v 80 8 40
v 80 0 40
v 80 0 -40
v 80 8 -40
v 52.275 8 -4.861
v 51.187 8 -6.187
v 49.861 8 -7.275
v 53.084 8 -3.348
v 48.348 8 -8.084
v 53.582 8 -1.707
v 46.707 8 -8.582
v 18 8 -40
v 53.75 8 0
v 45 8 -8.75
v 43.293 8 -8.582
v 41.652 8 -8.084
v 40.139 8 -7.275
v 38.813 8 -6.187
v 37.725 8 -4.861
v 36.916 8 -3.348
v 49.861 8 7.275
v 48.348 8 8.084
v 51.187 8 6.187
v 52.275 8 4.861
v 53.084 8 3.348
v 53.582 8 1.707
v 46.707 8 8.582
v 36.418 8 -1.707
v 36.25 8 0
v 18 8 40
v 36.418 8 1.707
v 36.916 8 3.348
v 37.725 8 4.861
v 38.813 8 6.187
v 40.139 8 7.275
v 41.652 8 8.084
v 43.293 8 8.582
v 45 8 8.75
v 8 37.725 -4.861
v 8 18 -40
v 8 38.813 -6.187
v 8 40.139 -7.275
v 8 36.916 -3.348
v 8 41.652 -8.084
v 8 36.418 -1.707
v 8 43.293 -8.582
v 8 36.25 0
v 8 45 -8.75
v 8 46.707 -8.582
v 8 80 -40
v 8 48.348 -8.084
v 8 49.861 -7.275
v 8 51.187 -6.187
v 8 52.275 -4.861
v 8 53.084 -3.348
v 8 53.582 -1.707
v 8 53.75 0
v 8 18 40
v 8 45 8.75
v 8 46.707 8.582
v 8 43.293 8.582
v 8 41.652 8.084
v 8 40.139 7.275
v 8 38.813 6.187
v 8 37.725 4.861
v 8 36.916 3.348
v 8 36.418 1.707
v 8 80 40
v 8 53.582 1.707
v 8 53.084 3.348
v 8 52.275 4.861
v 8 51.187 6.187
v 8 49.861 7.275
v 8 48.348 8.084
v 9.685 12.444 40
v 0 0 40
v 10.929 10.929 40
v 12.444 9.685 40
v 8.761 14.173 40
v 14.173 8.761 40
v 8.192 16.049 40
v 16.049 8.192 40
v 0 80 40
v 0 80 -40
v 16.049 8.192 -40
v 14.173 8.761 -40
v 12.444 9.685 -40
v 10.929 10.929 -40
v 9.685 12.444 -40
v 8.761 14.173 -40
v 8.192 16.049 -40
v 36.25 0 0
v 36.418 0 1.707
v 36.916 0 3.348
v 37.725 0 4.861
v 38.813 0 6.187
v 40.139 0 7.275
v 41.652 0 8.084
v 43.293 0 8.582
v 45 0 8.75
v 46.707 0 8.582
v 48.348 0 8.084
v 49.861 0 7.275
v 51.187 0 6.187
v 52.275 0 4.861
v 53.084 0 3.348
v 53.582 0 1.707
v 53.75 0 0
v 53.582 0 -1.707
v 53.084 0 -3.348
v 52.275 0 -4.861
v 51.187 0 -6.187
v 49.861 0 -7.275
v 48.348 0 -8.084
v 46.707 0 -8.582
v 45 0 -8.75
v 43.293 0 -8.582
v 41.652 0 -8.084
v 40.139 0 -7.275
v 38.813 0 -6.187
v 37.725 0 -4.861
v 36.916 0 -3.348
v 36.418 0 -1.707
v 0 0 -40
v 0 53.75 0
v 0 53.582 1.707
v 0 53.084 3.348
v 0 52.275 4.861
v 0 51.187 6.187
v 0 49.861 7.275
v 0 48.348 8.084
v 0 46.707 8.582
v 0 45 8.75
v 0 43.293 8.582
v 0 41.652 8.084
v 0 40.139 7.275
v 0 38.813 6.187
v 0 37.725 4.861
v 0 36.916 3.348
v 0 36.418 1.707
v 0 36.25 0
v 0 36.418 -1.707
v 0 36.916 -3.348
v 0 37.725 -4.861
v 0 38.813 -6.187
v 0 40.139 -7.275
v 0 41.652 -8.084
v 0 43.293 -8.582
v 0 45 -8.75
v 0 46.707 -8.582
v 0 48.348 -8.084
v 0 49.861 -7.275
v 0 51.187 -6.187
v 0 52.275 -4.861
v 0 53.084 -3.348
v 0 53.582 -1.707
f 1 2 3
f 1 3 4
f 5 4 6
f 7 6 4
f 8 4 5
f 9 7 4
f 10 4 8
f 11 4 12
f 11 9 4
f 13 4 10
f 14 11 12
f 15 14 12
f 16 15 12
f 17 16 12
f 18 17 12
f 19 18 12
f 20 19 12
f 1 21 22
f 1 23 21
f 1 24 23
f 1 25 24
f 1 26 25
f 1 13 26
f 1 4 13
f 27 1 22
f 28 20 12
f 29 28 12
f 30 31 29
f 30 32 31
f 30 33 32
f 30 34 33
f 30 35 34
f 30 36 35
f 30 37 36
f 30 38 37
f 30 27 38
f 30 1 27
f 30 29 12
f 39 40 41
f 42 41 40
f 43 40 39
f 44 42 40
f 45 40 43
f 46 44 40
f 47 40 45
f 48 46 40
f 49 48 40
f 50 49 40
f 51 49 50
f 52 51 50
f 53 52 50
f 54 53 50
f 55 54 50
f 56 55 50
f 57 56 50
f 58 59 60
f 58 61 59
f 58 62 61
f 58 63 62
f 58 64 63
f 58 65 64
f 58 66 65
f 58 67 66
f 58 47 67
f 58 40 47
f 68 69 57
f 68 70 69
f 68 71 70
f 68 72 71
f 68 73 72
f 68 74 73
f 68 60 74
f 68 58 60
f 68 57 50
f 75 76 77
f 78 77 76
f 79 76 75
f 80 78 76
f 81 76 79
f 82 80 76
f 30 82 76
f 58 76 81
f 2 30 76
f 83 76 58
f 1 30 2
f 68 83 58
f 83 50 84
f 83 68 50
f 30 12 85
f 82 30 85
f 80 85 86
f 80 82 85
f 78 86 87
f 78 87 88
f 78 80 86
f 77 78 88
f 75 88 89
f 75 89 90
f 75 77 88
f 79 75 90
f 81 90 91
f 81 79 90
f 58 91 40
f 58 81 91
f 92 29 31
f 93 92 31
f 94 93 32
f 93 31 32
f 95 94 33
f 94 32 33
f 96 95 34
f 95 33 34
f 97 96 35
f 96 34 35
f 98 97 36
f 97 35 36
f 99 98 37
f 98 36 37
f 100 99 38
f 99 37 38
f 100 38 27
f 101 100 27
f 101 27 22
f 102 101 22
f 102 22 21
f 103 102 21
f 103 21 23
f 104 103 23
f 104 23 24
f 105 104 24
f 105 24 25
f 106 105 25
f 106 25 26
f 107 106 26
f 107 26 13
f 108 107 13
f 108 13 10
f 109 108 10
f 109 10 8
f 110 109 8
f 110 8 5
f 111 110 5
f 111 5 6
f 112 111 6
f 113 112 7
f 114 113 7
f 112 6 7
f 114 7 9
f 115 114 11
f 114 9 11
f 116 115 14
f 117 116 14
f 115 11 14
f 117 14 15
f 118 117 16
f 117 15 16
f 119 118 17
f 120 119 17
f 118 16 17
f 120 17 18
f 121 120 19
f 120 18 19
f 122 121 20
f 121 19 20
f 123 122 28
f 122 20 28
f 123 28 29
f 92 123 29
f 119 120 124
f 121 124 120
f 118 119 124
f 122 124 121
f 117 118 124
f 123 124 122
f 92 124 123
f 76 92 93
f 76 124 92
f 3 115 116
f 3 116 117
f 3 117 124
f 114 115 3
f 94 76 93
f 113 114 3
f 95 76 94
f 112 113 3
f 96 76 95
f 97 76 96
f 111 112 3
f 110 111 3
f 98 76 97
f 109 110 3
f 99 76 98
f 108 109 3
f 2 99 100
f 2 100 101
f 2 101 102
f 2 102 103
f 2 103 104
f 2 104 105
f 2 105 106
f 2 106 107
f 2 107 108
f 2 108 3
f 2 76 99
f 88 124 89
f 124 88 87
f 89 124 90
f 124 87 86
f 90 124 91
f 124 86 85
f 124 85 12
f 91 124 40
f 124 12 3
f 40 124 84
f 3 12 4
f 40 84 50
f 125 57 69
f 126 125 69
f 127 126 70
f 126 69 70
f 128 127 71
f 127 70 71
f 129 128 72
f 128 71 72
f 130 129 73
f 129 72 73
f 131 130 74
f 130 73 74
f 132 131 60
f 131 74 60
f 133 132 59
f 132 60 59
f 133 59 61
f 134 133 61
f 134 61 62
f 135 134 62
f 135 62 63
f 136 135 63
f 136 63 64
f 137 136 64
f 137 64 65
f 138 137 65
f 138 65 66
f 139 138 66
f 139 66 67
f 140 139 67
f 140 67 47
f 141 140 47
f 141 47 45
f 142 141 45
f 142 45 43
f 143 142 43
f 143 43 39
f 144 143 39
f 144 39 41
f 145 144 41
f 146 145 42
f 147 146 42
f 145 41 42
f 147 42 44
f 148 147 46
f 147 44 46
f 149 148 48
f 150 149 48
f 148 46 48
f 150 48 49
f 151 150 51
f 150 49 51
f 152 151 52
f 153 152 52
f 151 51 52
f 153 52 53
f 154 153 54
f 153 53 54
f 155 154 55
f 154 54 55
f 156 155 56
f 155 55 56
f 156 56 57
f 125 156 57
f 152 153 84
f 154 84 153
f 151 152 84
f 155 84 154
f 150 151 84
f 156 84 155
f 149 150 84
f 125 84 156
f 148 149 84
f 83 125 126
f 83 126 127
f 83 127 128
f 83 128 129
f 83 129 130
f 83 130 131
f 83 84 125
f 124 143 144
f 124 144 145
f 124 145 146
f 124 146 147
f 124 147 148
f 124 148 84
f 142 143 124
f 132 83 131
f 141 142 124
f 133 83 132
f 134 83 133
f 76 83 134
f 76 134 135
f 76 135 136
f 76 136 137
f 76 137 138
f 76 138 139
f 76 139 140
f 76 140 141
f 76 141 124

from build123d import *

# Parameters (mm, degrees)
AUFSATZ_AUFTRAGEN_MAIN_BODY_DEPTH = 40
SKIZZE3_R                         = 8.75
BOHRUNG_HORIZONTAL_DEPTH          = 115.821600755
SKIZZE4_R                         = 8.75
BOHRUNG_VERTIKAL_DEPTH            = 115.821600755


with BuildPart() as part:
    # Skizze1 → Aufsatz Auftragen Main Body (new, symmetric)
    with BuildSketch(Plane.XY):
        with BuildLine():
            Line((0, 0), (80, 0))
            Line((80, 0), (80, 8))
            Line((80, 8), (18, 8))
            ThreePointArc((18, 8), (10.928932188, 10.928932188), (8, 18))
            Line((8, 18), (8, 80))
            Line((8, 80), (0, 80))
            Line((0, 80), (0, 0))
        make_face()
    extrude(amount=AUFSATZ_AUFTRAGEN_MAIN_BODY_DEPTH, both=True)

    # Skizze3 → Bohrung Horizontal (cut, through all)
    with BuildSketch(Plane(origin=(0, 8, 0), x_dir=(1, 0, 0), z_dir=(0, 1, 0))):
        with Locations(Location((45, 0, 0), (0, 0, 180))):
            Circle(SKIZZE3_R)
    extrude(amount=-BOHRUNG_HORIZONTAL_DEPTH, mode=Mode.SUBTRACT)

    # Skizze4 → Bohrung Vertikal (cut, through all)
    with BuildSketch(Plane(origin=(8, 0, 0), x_dir=(0, 0, -1), z_dir=(1, 0, 0))):
        with Locations(Location((0, 45, 0), (0, 0, 90))):
            Circle(SKIZZE4_R)
    extrude(amount=-BOHRUNG_VERTIKAL_DEPTH, mode=Mode.SUBTRACT)


solid = part.part
